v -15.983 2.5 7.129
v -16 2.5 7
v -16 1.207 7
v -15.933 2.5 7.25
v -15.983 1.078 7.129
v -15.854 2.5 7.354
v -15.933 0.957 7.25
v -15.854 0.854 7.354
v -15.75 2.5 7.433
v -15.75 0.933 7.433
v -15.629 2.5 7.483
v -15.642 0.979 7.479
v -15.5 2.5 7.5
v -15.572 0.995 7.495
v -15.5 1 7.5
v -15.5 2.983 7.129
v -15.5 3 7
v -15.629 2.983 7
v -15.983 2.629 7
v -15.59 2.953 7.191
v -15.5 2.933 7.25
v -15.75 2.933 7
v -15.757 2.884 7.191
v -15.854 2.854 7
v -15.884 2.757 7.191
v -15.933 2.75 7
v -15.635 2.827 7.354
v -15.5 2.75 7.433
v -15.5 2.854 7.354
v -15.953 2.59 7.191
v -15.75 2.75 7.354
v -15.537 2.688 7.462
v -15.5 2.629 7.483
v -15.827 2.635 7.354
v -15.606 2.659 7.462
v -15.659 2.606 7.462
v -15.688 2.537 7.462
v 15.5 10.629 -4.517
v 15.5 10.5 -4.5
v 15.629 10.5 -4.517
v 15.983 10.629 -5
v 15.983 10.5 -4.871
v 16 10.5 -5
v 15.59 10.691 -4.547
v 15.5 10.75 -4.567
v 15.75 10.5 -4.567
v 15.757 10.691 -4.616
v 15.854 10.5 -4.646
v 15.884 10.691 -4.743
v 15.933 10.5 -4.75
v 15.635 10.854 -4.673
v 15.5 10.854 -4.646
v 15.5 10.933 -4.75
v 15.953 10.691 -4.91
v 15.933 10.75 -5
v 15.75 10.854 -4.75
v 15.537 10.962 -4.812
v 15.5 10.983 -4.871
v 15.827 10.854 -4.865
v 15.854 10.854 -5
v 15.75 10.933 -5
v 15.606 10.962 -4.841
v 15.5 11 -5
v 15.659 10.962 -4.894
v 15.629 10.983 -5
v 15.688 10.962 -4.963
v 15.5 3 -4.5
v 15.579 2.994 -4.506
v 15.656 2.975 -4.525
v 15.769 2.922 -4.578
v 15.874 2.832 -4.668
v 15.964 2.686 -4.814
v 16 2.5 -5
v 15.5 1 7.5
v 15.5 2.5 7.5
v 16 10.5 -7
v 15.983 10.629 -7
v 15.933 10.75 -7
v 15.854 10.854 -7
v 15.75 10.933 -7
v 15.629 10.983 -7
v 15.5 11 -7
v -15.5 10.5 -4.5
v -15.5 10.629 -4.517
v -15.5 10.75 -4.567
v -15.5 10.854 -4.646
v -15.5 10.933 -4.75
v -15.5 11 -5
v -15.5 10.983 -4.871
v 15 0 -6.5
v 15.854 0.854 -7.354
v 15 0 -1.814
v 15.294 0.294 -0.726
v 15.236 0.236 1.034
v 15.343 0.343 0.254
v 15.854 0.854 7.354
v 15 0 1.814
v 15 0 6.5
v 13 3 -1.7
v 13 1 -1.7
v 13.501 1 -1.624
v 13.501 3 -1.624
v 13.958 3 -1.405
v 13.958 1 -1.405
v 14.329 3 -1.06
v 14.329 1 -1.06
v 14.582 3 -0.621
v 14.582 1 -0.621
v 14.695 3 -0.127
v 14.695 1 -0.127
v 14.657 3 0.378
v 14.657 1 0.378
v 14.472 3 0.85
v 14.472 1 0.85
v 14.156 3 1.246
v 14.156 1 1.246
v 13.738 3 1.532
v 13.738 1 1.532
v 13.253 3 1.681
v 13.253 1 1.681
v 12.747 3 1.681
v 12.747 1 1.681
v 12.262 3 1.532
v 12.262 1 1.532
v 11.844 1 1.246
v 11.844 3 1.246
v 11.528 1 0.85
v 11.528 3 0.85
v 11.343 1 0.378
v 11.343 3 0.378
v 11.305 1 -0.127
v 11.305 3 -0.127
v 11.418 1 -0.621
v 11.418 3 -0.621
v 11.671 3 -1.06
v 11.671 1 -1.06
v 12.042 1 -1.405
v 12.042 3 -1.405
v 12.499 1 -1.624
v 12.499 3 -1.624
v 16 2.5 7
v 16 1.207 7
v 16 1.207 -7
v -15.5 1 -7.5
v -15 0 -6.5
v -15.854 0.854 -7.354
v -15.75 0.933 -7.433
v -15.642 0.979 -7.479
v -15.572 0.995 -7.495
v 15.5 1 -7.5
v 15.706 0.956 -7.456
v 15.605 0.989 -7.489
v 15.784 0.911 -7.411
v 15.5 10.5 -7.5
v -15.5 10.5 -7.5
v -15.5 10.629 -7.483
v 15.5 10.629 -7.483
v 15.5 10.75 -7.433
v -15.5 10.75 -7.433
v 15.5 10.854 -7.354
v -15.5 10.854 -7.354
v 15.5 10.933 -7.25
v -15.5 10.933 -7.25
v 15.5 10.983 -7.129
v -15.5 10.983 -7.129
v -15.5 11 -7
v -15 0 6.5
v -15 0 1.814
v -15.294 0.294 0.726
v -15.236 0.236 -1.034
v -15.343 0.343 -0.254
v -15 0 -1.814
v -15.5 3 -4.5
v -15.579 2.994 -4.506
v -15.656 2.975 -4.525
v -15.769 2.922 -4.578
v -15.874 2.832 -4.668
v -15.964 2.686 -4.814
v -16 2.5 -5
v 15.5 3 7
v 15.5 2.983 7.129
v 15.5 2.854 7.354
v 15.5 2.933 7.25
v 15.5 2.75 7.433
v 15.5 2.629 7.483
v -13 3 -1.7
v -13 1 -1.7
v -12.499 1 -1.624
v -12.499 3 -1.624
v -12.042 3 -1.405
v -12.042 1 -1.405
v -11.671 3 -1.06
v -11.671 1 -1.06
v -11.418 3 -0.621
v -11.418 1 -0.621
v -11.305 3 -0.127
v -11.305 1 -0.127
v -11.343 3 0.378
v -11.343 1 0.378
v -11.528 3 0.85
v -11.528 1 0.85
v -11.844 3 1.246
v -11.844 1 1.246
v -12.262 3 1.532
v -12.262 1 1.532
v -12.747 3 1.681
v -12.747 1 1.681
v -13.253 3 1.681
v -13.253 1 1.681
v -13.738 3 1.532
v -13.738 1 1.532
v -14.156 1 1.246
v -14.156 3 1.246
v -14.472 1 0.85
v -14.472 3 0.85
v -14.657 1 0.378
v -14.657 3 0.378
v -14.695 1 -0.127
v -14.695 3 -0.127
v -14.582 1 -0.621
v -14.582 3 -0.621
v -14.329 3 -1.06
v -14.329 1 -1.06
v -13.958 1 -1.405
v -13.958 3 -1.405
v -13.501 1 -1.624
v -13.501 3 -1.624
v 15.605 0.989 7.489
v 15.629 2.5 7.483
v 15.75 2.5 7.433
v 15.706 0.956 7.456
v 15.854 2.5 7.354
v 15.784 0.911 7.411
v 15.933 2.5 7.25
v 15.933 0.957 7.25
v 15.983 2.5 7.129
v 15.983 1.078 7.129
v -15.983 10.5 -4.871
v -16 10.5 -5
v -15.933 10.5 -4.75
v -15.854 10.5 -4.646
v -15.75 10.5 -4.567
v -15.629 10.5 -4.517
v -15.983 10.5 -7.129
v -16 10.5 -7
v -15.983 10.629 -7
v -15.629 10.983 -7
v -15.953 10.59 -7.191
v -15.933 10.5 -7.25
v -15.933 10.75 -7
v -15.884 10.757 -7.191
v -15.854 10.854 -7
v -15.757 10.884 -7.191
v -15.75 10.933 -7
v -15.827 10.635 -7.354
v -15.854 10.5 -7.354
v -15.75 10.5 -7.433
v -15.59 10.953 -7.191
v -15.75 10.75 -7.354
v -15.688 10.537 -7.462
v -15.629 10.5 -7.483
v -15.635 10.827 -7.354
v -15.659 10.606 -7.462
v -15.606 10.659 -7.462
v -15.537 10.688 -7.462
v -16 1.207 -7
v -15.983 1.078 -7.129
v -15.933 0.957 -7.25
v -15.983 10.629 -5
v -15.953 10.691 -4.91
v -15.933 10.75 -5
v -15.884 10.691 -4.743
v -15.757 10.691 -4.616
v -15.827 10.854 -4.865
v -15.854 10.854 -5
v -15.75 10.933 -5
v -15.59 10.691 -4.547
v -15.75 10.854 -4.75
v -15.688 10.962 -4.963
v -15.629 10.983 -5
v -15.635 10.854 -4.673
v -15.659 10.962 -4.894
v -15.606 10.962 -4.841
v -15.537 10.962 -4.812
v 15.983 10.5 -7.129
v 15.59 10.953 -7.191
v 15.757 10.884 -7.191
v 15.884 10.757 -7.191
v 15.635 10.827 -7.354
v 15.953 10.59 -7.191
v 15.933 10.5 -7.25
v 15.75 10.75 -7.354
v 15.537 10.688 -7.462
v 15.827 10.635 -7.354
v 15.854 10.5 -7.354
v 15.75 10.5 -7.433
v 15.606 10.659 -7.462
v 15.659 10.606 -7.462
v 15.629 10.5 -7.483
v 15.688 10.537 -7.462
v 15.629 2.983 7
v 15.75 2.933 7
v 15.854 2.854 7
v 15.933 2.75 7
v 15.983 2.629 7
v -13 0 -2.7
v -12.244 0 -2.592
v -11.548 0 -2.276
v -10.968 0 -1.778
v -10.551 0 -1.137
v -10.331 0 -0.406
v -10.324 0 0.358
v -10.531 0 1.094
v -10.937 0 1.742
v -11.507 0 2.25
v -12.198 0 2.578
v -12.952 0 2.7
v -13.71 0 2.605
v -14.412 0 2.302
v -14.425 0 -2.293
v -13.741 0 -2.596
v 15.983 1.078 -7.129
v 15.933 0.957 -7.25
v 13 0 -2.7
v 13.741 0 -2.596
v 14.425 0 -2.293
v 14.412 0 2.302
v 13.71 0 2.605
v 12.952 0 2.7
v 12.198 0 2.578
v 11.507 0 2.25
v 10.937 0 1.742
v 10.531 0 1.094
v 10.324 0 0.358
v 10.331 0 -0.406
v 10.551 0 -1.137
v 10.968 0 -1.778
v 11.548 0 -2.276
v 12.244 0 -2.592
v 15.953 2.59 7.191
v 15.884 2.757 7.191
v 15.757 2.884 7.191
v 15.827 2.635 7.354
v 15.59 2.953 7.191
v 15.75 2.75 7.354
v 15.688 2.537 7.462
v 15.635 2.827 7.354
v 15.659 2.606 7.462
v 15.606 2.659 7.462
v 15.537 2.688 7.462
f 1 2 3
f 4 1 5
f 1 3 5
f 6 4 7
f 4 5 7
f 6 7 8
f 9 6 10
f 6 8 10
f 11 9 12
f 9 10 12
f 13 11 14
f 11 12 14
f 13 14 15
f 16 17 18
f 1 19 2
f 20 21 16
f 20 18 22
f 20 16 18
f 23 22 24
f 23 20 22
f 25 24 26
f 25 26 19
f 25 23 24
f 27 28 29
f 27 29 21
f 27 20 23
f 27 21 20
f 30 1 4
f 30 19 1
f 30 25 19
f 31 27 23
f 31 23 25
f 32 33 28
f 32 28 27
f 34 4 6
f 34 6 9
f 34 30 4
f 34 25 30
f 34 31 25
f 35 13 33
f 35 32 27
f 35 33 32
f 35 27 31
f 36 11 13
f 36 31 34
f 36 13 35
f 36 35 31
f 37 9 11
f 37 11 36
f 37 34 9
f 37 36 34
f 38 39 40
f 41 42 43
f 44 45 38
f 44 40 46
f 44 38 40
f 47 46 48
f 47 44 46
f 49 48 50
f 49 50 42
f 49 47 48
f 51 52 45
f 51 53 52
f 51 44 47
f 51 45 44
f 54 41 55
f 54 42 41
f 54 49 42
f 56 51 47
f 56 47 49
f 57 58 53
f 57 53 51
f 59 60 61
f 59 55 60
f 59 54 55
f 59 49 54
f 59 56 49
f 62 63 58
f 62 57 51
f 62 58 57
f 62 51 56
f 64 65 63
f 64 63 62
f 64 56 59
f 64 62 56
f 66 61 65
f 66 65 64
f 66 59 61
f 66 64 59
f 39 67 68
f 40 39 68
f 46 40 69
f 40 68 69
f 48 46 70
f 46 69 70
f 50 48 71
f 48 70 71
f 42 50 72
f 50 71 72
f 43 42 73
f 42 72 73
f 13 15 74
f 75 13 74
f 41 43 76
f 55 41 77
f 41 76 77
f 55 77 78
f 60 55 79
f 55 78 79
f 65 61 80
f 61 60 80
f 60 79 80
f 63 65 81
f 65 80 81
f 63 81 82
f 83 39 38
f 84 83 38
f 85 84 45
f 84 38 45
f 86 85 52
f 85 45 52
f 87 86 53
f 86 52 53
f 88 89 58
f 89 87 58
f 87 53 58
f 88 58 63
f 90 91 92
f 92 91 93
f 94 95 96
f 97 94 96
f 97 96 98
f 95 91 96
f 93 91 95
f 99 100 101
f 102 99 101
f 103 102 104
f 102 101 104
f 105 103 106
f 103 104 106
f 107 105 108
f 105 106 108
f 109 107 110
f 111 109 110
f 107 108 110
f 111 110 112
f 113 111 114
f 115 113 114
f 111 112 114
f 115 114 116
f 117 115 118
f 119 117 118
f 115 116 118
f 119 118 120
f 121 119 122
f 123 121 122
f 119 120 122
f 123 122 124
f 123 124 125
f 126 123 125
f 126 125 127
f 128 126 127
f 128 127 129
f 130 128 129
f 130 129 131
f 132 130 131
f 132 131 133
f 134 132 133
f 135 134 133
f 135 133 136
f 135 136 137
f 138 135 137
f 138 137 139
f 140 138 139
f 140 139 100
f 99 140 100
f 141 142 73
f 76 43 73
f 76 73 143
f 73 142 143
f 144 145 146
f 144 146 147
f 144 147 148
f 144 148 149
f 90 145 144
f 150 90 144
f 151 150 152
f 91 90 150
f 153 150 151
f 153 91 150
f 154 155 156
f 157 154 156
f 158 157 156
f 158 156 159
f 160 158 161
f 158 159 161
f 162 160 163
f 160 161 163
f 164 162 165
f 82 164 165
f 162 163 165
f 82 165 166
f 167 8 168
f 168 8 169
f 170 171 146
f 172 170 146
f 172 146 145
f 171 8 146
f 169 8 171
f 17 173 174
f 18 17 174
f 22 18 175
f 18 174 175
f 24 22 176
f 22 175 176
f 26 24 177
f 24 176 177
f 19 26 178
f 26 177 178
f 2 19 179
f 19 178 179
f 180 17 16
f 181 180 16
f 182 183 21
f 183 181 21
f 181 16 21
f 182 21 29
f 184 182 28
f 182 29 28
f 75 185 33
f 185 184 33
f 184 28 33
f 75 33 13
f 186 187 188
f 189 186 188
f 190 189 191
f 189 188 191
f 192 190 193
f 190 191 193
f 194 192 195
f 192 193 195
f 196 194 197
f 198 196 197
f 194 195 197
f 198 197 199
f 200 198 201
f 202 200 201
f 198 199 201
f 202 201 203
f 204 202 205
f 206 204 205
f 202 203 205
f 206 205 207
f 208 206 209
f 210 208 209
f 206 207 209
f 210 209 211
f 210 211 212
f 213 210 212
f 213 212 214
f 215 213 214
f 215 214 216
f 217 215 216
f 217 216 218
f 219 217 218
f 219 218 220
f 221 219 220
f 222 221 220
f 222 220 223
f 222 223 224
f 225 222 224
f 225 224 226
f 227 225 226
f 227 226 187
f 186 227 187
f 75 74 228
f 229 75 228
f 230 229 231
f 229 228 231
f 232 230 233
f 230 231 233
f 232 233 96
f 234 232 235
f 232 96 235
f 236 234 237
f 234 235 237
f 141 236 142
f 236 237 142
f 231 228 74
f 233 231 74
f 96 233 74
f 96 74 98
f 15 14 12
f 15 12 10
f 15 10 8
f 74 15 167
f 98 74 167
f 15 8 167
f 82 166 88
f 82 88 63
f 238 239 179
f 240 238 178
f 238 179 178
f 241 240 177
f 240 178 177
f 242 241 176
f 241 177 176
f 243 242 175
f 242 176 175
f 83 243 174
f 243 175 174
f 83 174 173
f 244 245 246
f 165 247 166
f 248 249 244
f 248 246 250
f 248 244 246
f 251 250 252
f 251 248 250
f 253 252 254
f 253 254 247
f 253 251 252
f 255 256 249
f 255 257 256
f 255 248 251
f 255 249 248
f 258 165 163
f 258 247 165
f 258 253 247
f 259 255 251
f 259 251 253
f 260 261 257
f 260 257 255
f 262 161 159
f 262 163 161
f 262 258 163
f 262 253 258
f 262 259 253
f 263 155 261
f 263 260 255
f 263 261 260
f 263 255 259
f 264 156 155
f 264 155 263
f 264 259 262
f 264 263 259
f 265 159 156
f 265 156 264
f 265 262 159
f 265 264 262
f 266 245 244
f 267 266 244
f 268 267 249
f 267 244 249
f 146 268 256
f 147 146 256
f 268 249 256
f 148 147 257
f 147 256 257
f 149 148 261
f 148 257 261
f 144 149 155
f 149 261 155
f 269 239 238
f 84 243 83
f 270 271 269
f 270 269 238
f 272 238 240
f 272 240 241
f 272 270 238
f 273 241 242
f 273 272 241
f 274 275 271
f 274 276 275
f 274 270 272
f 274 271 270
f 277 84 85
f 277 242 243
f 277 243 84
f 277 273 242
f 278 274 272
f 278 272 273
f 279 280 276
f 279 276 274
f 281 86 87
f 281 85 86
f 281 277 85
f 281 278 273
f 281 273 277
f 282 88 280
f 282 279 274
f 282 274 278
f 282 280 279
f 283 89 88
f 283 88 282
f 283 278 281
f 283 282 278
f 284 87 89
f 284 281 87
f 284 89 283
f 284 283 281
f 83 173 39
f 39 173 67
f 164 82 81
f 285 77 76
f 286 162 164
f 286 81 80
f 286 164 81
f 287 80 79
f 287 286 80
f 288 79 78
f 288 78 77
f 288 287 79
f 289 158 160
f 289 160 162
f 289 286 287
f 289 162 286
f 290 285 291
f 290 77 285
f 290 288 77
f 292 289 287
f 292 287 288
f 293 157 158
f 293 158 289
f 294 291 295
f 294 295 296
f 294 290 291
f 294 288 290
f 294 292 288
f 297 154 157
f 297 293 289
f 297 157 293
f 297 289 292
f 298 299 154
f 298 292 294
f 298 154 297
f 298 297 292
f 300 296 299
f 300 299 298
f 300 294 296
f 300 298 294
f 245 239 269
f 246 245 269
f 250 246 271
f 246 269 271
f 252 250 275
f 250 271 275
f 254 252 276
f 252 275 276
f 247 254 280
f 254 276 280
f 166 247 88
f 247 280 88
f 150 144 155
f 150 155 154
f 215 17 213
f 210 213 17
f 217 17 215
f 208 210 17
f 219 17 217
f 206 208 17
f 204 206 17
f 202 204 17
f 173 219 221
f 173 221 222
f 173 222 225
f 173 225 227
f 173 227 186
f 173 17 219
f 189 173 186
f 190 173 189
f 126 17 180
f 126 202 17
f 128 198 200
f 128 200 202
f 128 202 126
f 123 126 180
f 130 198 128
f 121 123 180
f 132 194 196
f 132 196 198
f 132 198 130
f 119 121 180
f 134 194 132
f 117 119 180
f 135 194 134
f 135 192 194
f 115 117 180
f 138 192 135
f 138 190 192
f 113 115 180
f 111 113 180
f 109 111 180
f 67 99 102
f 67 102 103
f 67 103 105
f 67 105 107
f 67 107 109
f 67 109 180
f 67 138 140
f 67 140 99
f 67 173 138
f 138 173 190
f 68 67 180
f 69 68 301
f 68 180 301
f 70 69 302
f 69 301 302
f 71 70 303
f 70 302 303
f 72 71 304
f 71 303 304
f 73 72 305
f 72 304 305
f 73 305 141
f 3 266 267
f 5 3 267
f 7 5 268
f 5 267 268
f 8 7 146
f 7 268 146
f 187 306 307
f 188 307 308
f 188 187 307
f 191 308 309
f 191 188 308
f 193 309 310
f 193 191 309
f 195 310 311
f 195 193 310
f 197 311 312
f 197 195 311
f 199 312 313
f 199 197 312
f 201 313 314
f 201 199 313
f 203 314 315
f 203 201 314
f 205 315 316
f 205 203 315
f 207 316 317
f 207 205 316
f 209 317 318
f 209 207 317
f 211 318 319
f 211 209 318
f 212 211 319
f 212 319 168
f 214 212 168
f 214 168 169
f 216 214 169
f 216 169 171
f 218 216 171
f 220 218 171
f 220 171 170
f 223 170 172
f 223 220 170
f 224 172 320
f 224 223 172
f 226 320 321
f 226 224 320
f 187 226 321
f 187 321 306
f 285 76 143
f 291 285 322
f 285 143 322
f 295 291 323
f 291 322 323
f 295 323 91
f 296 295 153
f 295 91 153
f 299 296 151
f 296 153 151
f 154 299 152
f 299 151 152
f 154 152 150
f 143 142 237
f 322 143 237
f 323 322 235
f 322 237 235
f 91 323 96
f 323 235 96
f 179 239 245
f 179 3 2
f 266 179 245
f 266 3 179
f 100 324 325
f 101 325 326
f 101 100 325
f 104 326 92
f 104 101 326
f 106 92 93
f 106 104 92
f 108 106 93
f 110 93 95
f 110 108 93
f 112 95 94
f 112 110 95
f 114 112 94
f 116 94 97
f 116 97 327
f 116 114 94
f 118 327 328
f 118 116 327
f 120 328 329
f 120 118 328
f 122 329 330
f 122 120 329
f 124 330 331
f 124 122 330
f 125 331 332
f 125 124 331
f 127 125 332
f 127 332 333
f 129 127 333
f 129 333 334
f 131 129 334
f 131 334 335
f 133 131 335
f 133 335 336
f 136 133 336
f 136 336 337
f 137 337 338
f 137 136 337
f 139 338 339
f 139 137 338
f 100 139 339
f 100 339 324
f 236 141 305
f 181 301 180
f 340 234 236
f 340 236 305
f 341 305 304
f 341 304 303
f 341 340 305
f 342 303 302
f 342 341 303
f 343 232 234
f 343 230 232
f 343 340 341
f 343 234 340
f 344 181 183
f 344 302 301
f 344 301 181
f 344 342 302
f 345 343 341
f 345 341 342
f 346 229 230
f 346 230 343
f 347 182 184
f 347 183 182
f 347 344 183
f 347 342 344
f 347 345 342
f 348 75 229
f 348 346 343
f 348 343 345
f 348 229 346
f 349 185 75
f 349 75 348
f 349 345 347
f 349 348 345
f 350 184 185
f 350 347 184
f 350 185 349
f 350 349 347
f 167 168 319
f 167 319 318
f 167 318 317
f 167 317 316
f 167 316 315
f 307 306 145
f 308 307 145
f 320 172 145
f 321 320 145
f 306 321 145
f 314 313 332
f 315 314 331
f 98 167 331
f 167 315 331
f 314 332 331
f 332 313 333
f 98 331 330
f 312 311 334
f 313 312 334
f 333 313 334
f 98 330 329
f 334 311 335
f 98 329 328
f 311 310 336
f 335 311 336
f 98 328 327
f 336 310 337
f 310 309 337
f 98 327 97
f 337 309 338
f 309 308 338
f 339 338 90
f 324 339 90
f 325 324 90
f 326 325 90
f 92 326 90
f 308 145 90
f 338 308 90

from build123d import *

# Parameters (mm, degrees)
SKETCH_1_W          = 32
SKETCH_1_H          = 15
EXTRUDE_1_DEPTH     = 3
SKETCH_2_W          = 32
SKETCH_2_H          = 3
EXTRUDE_2_DEPTH     = 8
SKETCH_3_R          = 1.7
CUT_EXTRUDE_1_DEPTH = 8
CHAMFER_1_SIZE      = 1
FILLET_1_R          = 0.5
FILLET_2_R          = 0.5


with BuildPart() as part:
    # Эскиз1 → Бобышка-Вытянуть1 (new body)
    with BuildSketch(Plane(origin=(0, 0, 0), x_dir=(1, 0, 0), z_dir=(0, 1, 0))):
        Rectangle(SKETCH_1_W, SKETCH_1_H)
    extrude(amount=EXTRUDE_1_DEPTH)

    # Эскиз2 → Бобышка-Вытянуть2 (add)
    with BuildSketch(Plane(origin=(0, 3, 0), x_dir=(1, 0, 0), z_dir=(0, 1, 0))):
        with Locations((0, 6)):
            Rectangle(SKETCH_2_W, SKETCH_2_H)
    extrude(amount=EXTRUDE_2_DEPTH)

    # Эскиз3 → Вырез-Вытянуть1 (cut)
    with BuildSketch(Plane.XZ):
        with Locations(Location((13, 0, 0), (0, 0, 270))):
            Circle(SKETCH_3_R)
        with Locations(Location((-13, 0, 0), (0, 0, 270))):
            Circle(SKETCH_3_R)
    extrude(amount=-CUT_EXTRUDE_1_DEPTH, mode=Mode.SUBTRACT)

    # Фаска1
    # the kernel refuses this chamfer: 1 mm, written as the material it takes off along each edge
    with BuildSketch(Plane(origin=(13, 0, 0), x_dir=(0, 0, -1), z_dir=(-1, 0, 0))) as chamfer_1_piece_1:
        Polygon((1.7 + CHAMFER_1_SIZE, 0), (1.7, -CHAMFER_1_SIZE), (1.7, 0), align=None)
    revolve(axis=Axis((13, 0, 0), (0, -1, 0)), mode=Mode.SUBTRACT)
    with BuildSketch(Plane(origin=(-13, 0, 0), x_dir=(0, 0, -1), z_dir=(-1, 0, 0))) as chamfer_1_piece_2:
        Polygon((1.7 + CHAMFER_1_SIZE, 0), (1.7, -CHAMFER_1_SIZE), (1.7, 0), align=None)
    revolve(axis=Axis((-13, 0, 0), (0, -1, 0)), mode=Mode.SUBTRACT)
    with BuildSketch(Plane(origin=(-18.571682988, 0, 7.5), x_dir=(0, 0.9996219169112968, 0.027495876610586494), z_dir=(1, 0, 0))) as chamfer_1_piece_3:
        Polygon((CHAMFER_1_SIZE * 0.999621916911, -CHAMFER_1_SIZE * 0.0274958766106), (-CHAMFER_1_SIZE * 0.0274958766106, -CHAMFER_1_SIZE * 0.999621916911), (0, 0), align=None)
    extrude(amount=37.143365976, mode=Mode.SUBTRACT)
    with BuildSketch(Plane(origin=(-16, 0, -10.071682988), x_dir=(-0.02749587661058563, 0.9996219169112968, 0), z_dir=(0, 0, 1)), Plane(origin=(16, 0, 10.071682988), x_dir=(0.02749587661058563, 0.9996219169112968, 0), z_dir=(0, 0, -1))) as chamfer_1_piece_4:
        Polygon((CHAMFER_1_SIZE * 0.999621916911, -CHAMFER_1_SIZE * 0.0274958766106), (-CHAMFER_1_SIZE * 0.0274958766106, -CHAMFER_1_SIZE * 0.999621916911), (0, 0), align=None)
    extrude(amount=20.143365976, mode=Mode.SUBTRACT)
    with BuildSketch(Plane(origin=(18.571682988, 0, -7.5), x_dir=(0, -0.027495876610586365, 0.9996219169112968), z_dir=(-1, 0, 0))) as chamfer_1_piece_5:
        Polygon((CHAMFER_1_SIZE * 0.999621916911, CHAMFER_1_SIZE * 0.0274958766106), (-CHAMFER_1_SIZE * 0.0274958766106, CHAMFER_1_SIZE * 0.999621916911), (0, 0), align=None)
    extrude(amount=37.143365976, mode=Mode.SUBTRACT)

    # Скругление1
    # the kernel refuses this fillet: 0.5 mm, written as the material it takes off along each edge
    with BuildSketch(Plane(origin=(-15.5, 10.5, -5), x_dir=(0, 0, 1), z_dir=(0, 1, 0))) as fillet_1_piece_1_section:
        Polygon((0, 0), (FILLET_1_R, 0), (FILLET_1_R, -FILLET_1_R), (0, -FILLET_1_R), align=None)
    fillet_1_piece_1 = extrude(amount=FILLET_1_R, mode=Mode.PRIVATE)
    fillet_1_piece_1 = fillet_1_piece_1 - Plane(origin=(-15.5, 10.5, -5), x_dir=(0.7071067811865475, 0, -0.7071067811865475), z_dir=(0, 1, 0)) * Sphere(FILLET_1_R, mode=Mode.PRIVATE)
    add(fillet_1_piece_1, mode=Mode.SUBTRACT)
    with BuildSketch(Plane(origin=(15.5, 10.5, -5), x_dir=(1, 0, 0), z_dir=(0, 1, 0))) as fillet_1_piece_2_section:
        Polygon((0, 0), (FILLET_1_R, 0), (FILLET_1_R, -FILLET_1_R), (0, -FILLET_1_R), align=None)
    fillet_1_piece_2 = extrude(amount=FILLET_1_R, mode=Mode.PRIVATE)
    fillet_1_piece_2 = fillet_1_piece_2 - Plane(origin=(15.5, 10.5, -5), x_dir=(-0.7071067811865475, 0, -0.7071067811865475), z_dir=(0, 1, 0)) * Sphere(FILLET_1_R, mode=Mode.PRIVATE)
    add(fillet_1_piece_2, mode=Mode.SUBTRACT)
    with BuildSketch(Plane(origin=(-15.5, 10.5, -7), x_dir=(0, 1, 0), z_dir=(0, 0, -1))) as fillet_1_piece_3_section:
        Polygon((0, 0), (FILLET_1_R, 0), (FILLET_1_R, -FILLET_1_R), (0, -FILLET_1_R), align=None)
    fillet_1_piece_3 = extrude(amount=FILLET_1_R, mode=Mode.PRIVATE)
    fillet_1_piece_3 = fillet_1_piece_3 - Plane(origin=(-15.5, 10.5, -7), x_dir=(0.7071067811865475, -0.7071067811865475, 0), z_dir=(0, 0, -1)) * Sphere(FILLET_1_R, mode=Mode.PRIVATE)
    add(fillet_1_piece_3, mode=Mode.SUBTRACT)
    with BuildSketch(Plane(origin=(15.5, 10.5, -7), x_dir=(0, 1, 0), z_dir=(0, 0, -1))) as fillet_1_piece_4_section:
        Polygon((0, 0), (FILLET_1_R, 0), (FILLET_1_R, FILLET_1_R), (0, FILLET_1_R), align=None)
    fillet_1_piece_4 = extrude(amount=FILLET_1_R, mode=Mode.PRIVATE)
    fillet_1_piece_4 = fillet_1_piece_4 - Plane(origin=(15.5, 10.5, -7), x_dir=(-0.7071067811865475, -0.7071067811865475, 0), z_dir=(0, 0, -1)) * Sphere(FILLET_1_R, mode=Mode.PRIVATE)
    add(fillet_1_piece_4, mode=Mode.SUBTRACT)
    with BuildSketch(Plane(origin=(-16, 3, -4.5), x_dir=(1, 0, 0), z_dir=(0, 0, 1))) as fillet_1_piece_5:
        with BuildLine():
            CenterArc((FILLET_1_R, -FILLET_1_R), FILLET_1_R, 90, 90)
            Line((0, -FILLET_1_R), (0, 0))
            Line((0, 0), (FILLET_1_R, 0))
        make_face()
    extrude(amount=13.25, mode=Mode.SUBTRACT)
    with BuildSketch(Plane(origin=(-16, 3, -4.5), x_dir=(0, 0, -1), z_dir=(0, 1, 0))) as fillet_1_piece_6:
        with BuildLine():
            CenterArc((FILLET_1_R, -FILLET_1_R), FILLET_1_R, 90, 90)
            Line((0, -FILLET_1_R), (0, 0))
            Line((0, 0), (FILLET_1_R, 0))
        make_face()
    extrude(amount=7.5, mode=Mode.SUBTRACT)
    with BuildSketch(Plane(origin=(16, 3, -4.5), x_dir=(0, 0, -1), z_dir=(0, 1, 0))) as fillet_1_piece_7:
        with BuildLine():
            CenterArc((FILLET_1_R, FILLET_1_R), FILLET_1_R, 180, 90)
            Line((0, FILLET_1_R), (0, 0))
            Line((0, 0), (FILLET_1_R, 0))
        make_face()
    extrude(amount=7.5, mode=Mode.SUBTRACT)
    with BuildSketch(Plane(origin=(-16, 11, -5), x_dir=(0, -1, 0), z_dir=(0, 0, -1)), Plane(origin=(16, 11, -7), x_dir=(0, -1, 0), z_dir=(0, 0, 1))) as fillet_1_piece_8:
        with BuildLine():
            CenterArc((FILLET_1_R, -FILLET_1_R), FILLET_1_R, 90, 90)
            Line((0, -FILLET_1_R), (0, 0))
            Line((0, 0), (FILLET_1_R, 0))
        make_face()
    extrude(amount=2, mode=Mode.SUBTRACT)
    with BuildSketch(Plane(origin=(15.5, 11, -4.5), x_dir=(0, 0, -1), z_dir=(-1, 0, 0))) as fillet_1_piece_9:
        with BuildLine():
            CenterArc((FILLET_1_R, FILLET_1_R), FILLET_1_R, 180, 90)
            Line((0, FILLET_1_R), (0, 0))
            Line((0, 0), (FILLET_1_R, 0))
        make_face()
    extrude(amount=31, mode=Mode.SUBTRACT)
    with BuildSketch(Plane(origin=(-15.5, 11, -7.5), x_dir=(0, -1, 0), z_dir=(1, 0, 0))) as fillet_1_piece_10:
        with BuildLine():
            CenterArc((FILLET_1_R, -FILLET_1_R), FILLET_1_R, 90, 90)
            Line((0, -FILLET_1_R), (0, 0))
            Line((0, 0), (FILLET_1_R, 0))
        make_face()
    extrude(amount=31, mode=Mode.SUBTRACT)
    with BuildSketch(Plane(origin=(-16, 1, -8.017766953), x_dir=(0, 1, 0), z_dir=(0, 0, 1)), Plane(origin=(16, 1, 8.017766953), x_dir=(0, 1, 0), z_dir=(0, 0, -1))) as fillet_1_piece_11:
        with BuildLine():
            CenterArc((FILLET_1_R * 0.414213562373, -FILLET_1_R), FILLET_1_R, 90, 45)
            Line((-FILLET_1_R * 0.292893218814, -FILLET_1_R * 0.292893218814), (0, 0))
            Line((0, 0), (FILLET_1_R * 0.414213562373, 0))
        make_face()
    extrude(amount=16.035533906, mode=Mode.SUBTRACT)
    with BuildSketch(Plane(origin=(16, 3, 8.75), x_dir=(0, -1, 0), z_dir=(0, 0, -1))) as fillet_1_piece_12:
        with BuildLine():
            CenterArc((FILLET_1_R, FILLET_1_R), FILLET_1_R, 180, 90)
            Line((0, FILLET_1_R), (0, 0))
            Line((0, 0), (FILLET_1_R, 0))
        make_face()
    extrude(amount=13.25, mode=Mode.SUBTRACT)
    with BuildSketch(Plane(origin=(16, -0.25, 7.5), x_dir=(-1, 0, 0), z_dir=(0, 1, 0))) as fillet_1_piece_13:
        with BuildLine():
            CenterArc((FILLET_1_R, -FILLET_1_R), FILLET_1_R, 90, 90)
            Line((0, -FILLET_1_R), (0, 0))
            Line((0, 0), (FILLET_1_R, 0))
        make_face()
    extrude(amount=4.5, mode=Mode.SUBTRACT)
    with BuildSketch(Plane(origin=(-16, -0.25, 7.5), x_dir=(1, 0, 0), z_dir=(0, 1, 0))) as fillet_1_piece_14:
        with BuildLine():
            CenterArc((FILLET_1_R, FILLET_1_R), FILLET_1_R, 180, 90)
            Line((0, FILLET_1_R), (0, 0))
            Line((0, 0), (FILLET_1_R, 0))
        make_face()
    extrude(amount=4.5, mode=Mode.SUBTRACT)
    with BuildSketch(Plane(origin=(-16, 10.5, -7.5), x_dir=(0, 0, 1), z_dir=(0, -1, 0)), Plane(origin=(16, -0.25, -7.5), x_dir=(0, 0, 1), z_dir=(0, 1, 0))) as fillet_1_piece_15:
        with BuildLine():
            CenterArc((FILLET_1_R, -FILLET_1_R), FILLET_1_R, 90, 90)
            Line((0, -FILLET_1_R), (0, 0))
            Line((0, 0), (FILLET_1_R, 0))
        make_face()
    extrude(amount=10.75, mode=Mode.SUBTRACT)
    with BuildSketch(Plane(origin=(-16, 3, -5.75), x_dir=(1, 0, 0), z_dir=(0, 0, 1))) as fillet_1_piece_16a_section:
        with BuildLine():
            CenterArc((FILLET_1_R, -FILLET_1_R), FILLET_1_R, 90, 90)
            Line((0, -FILLET_1_R), (0, 0))
            Line((0, 0), (FILLET_1_R, 0))
        make_face()
    fillet_1_piece_16a = extrude(amount=14.5, mode=Mode.PRIVATE)
    fillet_1_piece_16a = split(fillet_1_piece_16a, bisect_by=Plane(origin=(-15.886802443, 2.886802443, -4.5), z_dir=(0, 0, -1)), keep=Keep.TOP, mode=Mode.PRIVATE)
    with BuildSketch(Plane(origin=(-16, 1.75, -4.5), x_dir=(0, 0, -1), z_dir=(0, 1, 0))) as fillet_1_piece_16b_section:
        with BuildLine():
            CenterArc((FILLET_1_R, -FILLET_1_R), FILLET_1_R, 90, 90)
            Line((0, -FILLET_1_R), (0, 0))
            Line((0, 0), (FILLET_1_R, 0))
        make_face()
    fillet_1_piece_16b = extrude(amount=8.75, mode=Mode.PRIVATE)
    fillet_1_piece_16b = split(fillet_1_piece_16b, bisect_by=Plane(origin=(-15.886802443, 3, -4.613197557), z_dir=(0, -1, 0)), keep=Keep.TOP, mode=Mode.PRIVATE)
    fillet_1_piece_16 = fillet_1_piece_16a & fillet_1_piece_16b
    add(fillet_1_piece_16, mode=Mode.SUBTRACT)
    with BuildSketch(Plane(origin=(16, 1.75, -4.5), x_dir=(0, 0, -1), z_dir=(0, 1, 0))) as fillet_1_piece_17a_section:
        with BuildLine():
            CenterArc((FILLET_1_R, FILLET_1_R), FILLET_1_R, 180, 90)
            Line((0, FILLET_1_R), (0, 0))
            Line((0, 0), (FILLET_1_R, 0))
        make_face()
    fillet_1_piece_17a = extrude(amount=8.75, mode=Mode.PRIVATE)
    fillet_1_piece_17a = split(fillet_1_piece_17a, bisect_by=Plane(origin=(15.886802443, 3, -4.613197557), z_dir=(0, -1, 0)), keep=Keep.TOP, mode=Mode.PRIVATE)
    with BuildSketch(Plane(origin=(16, 3, 8.75), x_dir=(0, -1, 0), z_dir=(0, 0, -1))) as fillet_1_piece_17b_section:
        with BuildLine():
            CenterArc((FILLET_1_R, FILLET_1_R), FILLET_1_R, 180, 90)
            Line((0, FILLET_1_R), (0, 0))
            Line((0, 0), (FILLET_1_R, 0))
        make_face()
    fillet_1_piece_17b = extrude(amount=14.5, mode=Mode.PRIVATE)
    fillet_1_piece_17b = split(fillet_1_piece_17b, bisect_by=Plane(origin=(15.886802443, 2.886802443, -4.5), z_dir=(0, 0, -1)), keep=Keep.TOP, mode=Mode.PRIVATE)
    fillet_1_piece_17 = fillet_1_piece_17a & fillet_1_piece_17b
    add(fillet_1_piece_17, mode=Mode.SUBTRACT)

    # Скругление2
    # the kernel refuses this fillet: 0.5 mm, written as the material it takes off along each edge
    with BuildSketch(Plane(origin=(-15.5, 2.5, 7), x_dir=(0, 1, 0), z_dir=(0, 0, 1))) as fillet_2_piece_1_section:
        Polygon((0, 0), (FILLET_2_R, 0), (FILLET_2_R, FILLET_2_R), (0, FILLET_2_R), align=None)
    fillet_2_piece_1 = extrude(amount=FILLET_2_R, mode=Mode.PRIVATE)
    fillet_2_piece_1 = fillet_2_piece_1 - Plane(origin=(-15.5, 2.5, 7), x_dir=(0.7071067811865475, -0.7071067811865475, 0), z_dir=(0, 0, 1)) * Sphere(FILLET_2_R, mode=Mode.PRIVATE)
    add(fillet_2_piece_1, mode=Mode.SUBTRACT)
    with BuildSketch(Plane(origin=(15.5, 2.5, 7), x_dir=(0, 1, 0), z_dir=(0, 0, 1))) as fillet_2_piece_2_section:
        Polygon((0, 0), (FILLET_2_R, 0), (FILLET_2_R, -FILLET_2_R), (0, -FILLET_2_R), align=None)
    fillet_2_piece_2 = extrude(amount=FILLET_2_R, mode=Mode.PRIVATE)
    fillet_2_piece_2 = fillet_2_piece_2 - Plane(origin=(15.5, 2.5, 7), x_dir=(-0.7071067811865475, -0.7071067811865475, 0), z_dir=(0, 0, 1)) * Sphere(FILLET_2_R, mode=Mode.PRIVATE)
    add(fillet_2_piece_2, mode=Mode.SUBTRACT)
    with BuildSketch(Plane(origin=(-15.5, 3, 7.5), x_dir=(0, -1, 0), z_dir=(1, 0, 0))) as fillet_2_piece_3:
        with BuildLine():
            CenterArc((FILLET_2_R, FILLET_2_R), FILLET_2_R, 180, 90)
            Line((0, FILLET_2_R), (0, 0))
            Line((0, 0), (FILLET_2_R, 0))
        make_face()
    extrude(amount=31, mode=Mode.SUBTRACT)


solid = part.part
